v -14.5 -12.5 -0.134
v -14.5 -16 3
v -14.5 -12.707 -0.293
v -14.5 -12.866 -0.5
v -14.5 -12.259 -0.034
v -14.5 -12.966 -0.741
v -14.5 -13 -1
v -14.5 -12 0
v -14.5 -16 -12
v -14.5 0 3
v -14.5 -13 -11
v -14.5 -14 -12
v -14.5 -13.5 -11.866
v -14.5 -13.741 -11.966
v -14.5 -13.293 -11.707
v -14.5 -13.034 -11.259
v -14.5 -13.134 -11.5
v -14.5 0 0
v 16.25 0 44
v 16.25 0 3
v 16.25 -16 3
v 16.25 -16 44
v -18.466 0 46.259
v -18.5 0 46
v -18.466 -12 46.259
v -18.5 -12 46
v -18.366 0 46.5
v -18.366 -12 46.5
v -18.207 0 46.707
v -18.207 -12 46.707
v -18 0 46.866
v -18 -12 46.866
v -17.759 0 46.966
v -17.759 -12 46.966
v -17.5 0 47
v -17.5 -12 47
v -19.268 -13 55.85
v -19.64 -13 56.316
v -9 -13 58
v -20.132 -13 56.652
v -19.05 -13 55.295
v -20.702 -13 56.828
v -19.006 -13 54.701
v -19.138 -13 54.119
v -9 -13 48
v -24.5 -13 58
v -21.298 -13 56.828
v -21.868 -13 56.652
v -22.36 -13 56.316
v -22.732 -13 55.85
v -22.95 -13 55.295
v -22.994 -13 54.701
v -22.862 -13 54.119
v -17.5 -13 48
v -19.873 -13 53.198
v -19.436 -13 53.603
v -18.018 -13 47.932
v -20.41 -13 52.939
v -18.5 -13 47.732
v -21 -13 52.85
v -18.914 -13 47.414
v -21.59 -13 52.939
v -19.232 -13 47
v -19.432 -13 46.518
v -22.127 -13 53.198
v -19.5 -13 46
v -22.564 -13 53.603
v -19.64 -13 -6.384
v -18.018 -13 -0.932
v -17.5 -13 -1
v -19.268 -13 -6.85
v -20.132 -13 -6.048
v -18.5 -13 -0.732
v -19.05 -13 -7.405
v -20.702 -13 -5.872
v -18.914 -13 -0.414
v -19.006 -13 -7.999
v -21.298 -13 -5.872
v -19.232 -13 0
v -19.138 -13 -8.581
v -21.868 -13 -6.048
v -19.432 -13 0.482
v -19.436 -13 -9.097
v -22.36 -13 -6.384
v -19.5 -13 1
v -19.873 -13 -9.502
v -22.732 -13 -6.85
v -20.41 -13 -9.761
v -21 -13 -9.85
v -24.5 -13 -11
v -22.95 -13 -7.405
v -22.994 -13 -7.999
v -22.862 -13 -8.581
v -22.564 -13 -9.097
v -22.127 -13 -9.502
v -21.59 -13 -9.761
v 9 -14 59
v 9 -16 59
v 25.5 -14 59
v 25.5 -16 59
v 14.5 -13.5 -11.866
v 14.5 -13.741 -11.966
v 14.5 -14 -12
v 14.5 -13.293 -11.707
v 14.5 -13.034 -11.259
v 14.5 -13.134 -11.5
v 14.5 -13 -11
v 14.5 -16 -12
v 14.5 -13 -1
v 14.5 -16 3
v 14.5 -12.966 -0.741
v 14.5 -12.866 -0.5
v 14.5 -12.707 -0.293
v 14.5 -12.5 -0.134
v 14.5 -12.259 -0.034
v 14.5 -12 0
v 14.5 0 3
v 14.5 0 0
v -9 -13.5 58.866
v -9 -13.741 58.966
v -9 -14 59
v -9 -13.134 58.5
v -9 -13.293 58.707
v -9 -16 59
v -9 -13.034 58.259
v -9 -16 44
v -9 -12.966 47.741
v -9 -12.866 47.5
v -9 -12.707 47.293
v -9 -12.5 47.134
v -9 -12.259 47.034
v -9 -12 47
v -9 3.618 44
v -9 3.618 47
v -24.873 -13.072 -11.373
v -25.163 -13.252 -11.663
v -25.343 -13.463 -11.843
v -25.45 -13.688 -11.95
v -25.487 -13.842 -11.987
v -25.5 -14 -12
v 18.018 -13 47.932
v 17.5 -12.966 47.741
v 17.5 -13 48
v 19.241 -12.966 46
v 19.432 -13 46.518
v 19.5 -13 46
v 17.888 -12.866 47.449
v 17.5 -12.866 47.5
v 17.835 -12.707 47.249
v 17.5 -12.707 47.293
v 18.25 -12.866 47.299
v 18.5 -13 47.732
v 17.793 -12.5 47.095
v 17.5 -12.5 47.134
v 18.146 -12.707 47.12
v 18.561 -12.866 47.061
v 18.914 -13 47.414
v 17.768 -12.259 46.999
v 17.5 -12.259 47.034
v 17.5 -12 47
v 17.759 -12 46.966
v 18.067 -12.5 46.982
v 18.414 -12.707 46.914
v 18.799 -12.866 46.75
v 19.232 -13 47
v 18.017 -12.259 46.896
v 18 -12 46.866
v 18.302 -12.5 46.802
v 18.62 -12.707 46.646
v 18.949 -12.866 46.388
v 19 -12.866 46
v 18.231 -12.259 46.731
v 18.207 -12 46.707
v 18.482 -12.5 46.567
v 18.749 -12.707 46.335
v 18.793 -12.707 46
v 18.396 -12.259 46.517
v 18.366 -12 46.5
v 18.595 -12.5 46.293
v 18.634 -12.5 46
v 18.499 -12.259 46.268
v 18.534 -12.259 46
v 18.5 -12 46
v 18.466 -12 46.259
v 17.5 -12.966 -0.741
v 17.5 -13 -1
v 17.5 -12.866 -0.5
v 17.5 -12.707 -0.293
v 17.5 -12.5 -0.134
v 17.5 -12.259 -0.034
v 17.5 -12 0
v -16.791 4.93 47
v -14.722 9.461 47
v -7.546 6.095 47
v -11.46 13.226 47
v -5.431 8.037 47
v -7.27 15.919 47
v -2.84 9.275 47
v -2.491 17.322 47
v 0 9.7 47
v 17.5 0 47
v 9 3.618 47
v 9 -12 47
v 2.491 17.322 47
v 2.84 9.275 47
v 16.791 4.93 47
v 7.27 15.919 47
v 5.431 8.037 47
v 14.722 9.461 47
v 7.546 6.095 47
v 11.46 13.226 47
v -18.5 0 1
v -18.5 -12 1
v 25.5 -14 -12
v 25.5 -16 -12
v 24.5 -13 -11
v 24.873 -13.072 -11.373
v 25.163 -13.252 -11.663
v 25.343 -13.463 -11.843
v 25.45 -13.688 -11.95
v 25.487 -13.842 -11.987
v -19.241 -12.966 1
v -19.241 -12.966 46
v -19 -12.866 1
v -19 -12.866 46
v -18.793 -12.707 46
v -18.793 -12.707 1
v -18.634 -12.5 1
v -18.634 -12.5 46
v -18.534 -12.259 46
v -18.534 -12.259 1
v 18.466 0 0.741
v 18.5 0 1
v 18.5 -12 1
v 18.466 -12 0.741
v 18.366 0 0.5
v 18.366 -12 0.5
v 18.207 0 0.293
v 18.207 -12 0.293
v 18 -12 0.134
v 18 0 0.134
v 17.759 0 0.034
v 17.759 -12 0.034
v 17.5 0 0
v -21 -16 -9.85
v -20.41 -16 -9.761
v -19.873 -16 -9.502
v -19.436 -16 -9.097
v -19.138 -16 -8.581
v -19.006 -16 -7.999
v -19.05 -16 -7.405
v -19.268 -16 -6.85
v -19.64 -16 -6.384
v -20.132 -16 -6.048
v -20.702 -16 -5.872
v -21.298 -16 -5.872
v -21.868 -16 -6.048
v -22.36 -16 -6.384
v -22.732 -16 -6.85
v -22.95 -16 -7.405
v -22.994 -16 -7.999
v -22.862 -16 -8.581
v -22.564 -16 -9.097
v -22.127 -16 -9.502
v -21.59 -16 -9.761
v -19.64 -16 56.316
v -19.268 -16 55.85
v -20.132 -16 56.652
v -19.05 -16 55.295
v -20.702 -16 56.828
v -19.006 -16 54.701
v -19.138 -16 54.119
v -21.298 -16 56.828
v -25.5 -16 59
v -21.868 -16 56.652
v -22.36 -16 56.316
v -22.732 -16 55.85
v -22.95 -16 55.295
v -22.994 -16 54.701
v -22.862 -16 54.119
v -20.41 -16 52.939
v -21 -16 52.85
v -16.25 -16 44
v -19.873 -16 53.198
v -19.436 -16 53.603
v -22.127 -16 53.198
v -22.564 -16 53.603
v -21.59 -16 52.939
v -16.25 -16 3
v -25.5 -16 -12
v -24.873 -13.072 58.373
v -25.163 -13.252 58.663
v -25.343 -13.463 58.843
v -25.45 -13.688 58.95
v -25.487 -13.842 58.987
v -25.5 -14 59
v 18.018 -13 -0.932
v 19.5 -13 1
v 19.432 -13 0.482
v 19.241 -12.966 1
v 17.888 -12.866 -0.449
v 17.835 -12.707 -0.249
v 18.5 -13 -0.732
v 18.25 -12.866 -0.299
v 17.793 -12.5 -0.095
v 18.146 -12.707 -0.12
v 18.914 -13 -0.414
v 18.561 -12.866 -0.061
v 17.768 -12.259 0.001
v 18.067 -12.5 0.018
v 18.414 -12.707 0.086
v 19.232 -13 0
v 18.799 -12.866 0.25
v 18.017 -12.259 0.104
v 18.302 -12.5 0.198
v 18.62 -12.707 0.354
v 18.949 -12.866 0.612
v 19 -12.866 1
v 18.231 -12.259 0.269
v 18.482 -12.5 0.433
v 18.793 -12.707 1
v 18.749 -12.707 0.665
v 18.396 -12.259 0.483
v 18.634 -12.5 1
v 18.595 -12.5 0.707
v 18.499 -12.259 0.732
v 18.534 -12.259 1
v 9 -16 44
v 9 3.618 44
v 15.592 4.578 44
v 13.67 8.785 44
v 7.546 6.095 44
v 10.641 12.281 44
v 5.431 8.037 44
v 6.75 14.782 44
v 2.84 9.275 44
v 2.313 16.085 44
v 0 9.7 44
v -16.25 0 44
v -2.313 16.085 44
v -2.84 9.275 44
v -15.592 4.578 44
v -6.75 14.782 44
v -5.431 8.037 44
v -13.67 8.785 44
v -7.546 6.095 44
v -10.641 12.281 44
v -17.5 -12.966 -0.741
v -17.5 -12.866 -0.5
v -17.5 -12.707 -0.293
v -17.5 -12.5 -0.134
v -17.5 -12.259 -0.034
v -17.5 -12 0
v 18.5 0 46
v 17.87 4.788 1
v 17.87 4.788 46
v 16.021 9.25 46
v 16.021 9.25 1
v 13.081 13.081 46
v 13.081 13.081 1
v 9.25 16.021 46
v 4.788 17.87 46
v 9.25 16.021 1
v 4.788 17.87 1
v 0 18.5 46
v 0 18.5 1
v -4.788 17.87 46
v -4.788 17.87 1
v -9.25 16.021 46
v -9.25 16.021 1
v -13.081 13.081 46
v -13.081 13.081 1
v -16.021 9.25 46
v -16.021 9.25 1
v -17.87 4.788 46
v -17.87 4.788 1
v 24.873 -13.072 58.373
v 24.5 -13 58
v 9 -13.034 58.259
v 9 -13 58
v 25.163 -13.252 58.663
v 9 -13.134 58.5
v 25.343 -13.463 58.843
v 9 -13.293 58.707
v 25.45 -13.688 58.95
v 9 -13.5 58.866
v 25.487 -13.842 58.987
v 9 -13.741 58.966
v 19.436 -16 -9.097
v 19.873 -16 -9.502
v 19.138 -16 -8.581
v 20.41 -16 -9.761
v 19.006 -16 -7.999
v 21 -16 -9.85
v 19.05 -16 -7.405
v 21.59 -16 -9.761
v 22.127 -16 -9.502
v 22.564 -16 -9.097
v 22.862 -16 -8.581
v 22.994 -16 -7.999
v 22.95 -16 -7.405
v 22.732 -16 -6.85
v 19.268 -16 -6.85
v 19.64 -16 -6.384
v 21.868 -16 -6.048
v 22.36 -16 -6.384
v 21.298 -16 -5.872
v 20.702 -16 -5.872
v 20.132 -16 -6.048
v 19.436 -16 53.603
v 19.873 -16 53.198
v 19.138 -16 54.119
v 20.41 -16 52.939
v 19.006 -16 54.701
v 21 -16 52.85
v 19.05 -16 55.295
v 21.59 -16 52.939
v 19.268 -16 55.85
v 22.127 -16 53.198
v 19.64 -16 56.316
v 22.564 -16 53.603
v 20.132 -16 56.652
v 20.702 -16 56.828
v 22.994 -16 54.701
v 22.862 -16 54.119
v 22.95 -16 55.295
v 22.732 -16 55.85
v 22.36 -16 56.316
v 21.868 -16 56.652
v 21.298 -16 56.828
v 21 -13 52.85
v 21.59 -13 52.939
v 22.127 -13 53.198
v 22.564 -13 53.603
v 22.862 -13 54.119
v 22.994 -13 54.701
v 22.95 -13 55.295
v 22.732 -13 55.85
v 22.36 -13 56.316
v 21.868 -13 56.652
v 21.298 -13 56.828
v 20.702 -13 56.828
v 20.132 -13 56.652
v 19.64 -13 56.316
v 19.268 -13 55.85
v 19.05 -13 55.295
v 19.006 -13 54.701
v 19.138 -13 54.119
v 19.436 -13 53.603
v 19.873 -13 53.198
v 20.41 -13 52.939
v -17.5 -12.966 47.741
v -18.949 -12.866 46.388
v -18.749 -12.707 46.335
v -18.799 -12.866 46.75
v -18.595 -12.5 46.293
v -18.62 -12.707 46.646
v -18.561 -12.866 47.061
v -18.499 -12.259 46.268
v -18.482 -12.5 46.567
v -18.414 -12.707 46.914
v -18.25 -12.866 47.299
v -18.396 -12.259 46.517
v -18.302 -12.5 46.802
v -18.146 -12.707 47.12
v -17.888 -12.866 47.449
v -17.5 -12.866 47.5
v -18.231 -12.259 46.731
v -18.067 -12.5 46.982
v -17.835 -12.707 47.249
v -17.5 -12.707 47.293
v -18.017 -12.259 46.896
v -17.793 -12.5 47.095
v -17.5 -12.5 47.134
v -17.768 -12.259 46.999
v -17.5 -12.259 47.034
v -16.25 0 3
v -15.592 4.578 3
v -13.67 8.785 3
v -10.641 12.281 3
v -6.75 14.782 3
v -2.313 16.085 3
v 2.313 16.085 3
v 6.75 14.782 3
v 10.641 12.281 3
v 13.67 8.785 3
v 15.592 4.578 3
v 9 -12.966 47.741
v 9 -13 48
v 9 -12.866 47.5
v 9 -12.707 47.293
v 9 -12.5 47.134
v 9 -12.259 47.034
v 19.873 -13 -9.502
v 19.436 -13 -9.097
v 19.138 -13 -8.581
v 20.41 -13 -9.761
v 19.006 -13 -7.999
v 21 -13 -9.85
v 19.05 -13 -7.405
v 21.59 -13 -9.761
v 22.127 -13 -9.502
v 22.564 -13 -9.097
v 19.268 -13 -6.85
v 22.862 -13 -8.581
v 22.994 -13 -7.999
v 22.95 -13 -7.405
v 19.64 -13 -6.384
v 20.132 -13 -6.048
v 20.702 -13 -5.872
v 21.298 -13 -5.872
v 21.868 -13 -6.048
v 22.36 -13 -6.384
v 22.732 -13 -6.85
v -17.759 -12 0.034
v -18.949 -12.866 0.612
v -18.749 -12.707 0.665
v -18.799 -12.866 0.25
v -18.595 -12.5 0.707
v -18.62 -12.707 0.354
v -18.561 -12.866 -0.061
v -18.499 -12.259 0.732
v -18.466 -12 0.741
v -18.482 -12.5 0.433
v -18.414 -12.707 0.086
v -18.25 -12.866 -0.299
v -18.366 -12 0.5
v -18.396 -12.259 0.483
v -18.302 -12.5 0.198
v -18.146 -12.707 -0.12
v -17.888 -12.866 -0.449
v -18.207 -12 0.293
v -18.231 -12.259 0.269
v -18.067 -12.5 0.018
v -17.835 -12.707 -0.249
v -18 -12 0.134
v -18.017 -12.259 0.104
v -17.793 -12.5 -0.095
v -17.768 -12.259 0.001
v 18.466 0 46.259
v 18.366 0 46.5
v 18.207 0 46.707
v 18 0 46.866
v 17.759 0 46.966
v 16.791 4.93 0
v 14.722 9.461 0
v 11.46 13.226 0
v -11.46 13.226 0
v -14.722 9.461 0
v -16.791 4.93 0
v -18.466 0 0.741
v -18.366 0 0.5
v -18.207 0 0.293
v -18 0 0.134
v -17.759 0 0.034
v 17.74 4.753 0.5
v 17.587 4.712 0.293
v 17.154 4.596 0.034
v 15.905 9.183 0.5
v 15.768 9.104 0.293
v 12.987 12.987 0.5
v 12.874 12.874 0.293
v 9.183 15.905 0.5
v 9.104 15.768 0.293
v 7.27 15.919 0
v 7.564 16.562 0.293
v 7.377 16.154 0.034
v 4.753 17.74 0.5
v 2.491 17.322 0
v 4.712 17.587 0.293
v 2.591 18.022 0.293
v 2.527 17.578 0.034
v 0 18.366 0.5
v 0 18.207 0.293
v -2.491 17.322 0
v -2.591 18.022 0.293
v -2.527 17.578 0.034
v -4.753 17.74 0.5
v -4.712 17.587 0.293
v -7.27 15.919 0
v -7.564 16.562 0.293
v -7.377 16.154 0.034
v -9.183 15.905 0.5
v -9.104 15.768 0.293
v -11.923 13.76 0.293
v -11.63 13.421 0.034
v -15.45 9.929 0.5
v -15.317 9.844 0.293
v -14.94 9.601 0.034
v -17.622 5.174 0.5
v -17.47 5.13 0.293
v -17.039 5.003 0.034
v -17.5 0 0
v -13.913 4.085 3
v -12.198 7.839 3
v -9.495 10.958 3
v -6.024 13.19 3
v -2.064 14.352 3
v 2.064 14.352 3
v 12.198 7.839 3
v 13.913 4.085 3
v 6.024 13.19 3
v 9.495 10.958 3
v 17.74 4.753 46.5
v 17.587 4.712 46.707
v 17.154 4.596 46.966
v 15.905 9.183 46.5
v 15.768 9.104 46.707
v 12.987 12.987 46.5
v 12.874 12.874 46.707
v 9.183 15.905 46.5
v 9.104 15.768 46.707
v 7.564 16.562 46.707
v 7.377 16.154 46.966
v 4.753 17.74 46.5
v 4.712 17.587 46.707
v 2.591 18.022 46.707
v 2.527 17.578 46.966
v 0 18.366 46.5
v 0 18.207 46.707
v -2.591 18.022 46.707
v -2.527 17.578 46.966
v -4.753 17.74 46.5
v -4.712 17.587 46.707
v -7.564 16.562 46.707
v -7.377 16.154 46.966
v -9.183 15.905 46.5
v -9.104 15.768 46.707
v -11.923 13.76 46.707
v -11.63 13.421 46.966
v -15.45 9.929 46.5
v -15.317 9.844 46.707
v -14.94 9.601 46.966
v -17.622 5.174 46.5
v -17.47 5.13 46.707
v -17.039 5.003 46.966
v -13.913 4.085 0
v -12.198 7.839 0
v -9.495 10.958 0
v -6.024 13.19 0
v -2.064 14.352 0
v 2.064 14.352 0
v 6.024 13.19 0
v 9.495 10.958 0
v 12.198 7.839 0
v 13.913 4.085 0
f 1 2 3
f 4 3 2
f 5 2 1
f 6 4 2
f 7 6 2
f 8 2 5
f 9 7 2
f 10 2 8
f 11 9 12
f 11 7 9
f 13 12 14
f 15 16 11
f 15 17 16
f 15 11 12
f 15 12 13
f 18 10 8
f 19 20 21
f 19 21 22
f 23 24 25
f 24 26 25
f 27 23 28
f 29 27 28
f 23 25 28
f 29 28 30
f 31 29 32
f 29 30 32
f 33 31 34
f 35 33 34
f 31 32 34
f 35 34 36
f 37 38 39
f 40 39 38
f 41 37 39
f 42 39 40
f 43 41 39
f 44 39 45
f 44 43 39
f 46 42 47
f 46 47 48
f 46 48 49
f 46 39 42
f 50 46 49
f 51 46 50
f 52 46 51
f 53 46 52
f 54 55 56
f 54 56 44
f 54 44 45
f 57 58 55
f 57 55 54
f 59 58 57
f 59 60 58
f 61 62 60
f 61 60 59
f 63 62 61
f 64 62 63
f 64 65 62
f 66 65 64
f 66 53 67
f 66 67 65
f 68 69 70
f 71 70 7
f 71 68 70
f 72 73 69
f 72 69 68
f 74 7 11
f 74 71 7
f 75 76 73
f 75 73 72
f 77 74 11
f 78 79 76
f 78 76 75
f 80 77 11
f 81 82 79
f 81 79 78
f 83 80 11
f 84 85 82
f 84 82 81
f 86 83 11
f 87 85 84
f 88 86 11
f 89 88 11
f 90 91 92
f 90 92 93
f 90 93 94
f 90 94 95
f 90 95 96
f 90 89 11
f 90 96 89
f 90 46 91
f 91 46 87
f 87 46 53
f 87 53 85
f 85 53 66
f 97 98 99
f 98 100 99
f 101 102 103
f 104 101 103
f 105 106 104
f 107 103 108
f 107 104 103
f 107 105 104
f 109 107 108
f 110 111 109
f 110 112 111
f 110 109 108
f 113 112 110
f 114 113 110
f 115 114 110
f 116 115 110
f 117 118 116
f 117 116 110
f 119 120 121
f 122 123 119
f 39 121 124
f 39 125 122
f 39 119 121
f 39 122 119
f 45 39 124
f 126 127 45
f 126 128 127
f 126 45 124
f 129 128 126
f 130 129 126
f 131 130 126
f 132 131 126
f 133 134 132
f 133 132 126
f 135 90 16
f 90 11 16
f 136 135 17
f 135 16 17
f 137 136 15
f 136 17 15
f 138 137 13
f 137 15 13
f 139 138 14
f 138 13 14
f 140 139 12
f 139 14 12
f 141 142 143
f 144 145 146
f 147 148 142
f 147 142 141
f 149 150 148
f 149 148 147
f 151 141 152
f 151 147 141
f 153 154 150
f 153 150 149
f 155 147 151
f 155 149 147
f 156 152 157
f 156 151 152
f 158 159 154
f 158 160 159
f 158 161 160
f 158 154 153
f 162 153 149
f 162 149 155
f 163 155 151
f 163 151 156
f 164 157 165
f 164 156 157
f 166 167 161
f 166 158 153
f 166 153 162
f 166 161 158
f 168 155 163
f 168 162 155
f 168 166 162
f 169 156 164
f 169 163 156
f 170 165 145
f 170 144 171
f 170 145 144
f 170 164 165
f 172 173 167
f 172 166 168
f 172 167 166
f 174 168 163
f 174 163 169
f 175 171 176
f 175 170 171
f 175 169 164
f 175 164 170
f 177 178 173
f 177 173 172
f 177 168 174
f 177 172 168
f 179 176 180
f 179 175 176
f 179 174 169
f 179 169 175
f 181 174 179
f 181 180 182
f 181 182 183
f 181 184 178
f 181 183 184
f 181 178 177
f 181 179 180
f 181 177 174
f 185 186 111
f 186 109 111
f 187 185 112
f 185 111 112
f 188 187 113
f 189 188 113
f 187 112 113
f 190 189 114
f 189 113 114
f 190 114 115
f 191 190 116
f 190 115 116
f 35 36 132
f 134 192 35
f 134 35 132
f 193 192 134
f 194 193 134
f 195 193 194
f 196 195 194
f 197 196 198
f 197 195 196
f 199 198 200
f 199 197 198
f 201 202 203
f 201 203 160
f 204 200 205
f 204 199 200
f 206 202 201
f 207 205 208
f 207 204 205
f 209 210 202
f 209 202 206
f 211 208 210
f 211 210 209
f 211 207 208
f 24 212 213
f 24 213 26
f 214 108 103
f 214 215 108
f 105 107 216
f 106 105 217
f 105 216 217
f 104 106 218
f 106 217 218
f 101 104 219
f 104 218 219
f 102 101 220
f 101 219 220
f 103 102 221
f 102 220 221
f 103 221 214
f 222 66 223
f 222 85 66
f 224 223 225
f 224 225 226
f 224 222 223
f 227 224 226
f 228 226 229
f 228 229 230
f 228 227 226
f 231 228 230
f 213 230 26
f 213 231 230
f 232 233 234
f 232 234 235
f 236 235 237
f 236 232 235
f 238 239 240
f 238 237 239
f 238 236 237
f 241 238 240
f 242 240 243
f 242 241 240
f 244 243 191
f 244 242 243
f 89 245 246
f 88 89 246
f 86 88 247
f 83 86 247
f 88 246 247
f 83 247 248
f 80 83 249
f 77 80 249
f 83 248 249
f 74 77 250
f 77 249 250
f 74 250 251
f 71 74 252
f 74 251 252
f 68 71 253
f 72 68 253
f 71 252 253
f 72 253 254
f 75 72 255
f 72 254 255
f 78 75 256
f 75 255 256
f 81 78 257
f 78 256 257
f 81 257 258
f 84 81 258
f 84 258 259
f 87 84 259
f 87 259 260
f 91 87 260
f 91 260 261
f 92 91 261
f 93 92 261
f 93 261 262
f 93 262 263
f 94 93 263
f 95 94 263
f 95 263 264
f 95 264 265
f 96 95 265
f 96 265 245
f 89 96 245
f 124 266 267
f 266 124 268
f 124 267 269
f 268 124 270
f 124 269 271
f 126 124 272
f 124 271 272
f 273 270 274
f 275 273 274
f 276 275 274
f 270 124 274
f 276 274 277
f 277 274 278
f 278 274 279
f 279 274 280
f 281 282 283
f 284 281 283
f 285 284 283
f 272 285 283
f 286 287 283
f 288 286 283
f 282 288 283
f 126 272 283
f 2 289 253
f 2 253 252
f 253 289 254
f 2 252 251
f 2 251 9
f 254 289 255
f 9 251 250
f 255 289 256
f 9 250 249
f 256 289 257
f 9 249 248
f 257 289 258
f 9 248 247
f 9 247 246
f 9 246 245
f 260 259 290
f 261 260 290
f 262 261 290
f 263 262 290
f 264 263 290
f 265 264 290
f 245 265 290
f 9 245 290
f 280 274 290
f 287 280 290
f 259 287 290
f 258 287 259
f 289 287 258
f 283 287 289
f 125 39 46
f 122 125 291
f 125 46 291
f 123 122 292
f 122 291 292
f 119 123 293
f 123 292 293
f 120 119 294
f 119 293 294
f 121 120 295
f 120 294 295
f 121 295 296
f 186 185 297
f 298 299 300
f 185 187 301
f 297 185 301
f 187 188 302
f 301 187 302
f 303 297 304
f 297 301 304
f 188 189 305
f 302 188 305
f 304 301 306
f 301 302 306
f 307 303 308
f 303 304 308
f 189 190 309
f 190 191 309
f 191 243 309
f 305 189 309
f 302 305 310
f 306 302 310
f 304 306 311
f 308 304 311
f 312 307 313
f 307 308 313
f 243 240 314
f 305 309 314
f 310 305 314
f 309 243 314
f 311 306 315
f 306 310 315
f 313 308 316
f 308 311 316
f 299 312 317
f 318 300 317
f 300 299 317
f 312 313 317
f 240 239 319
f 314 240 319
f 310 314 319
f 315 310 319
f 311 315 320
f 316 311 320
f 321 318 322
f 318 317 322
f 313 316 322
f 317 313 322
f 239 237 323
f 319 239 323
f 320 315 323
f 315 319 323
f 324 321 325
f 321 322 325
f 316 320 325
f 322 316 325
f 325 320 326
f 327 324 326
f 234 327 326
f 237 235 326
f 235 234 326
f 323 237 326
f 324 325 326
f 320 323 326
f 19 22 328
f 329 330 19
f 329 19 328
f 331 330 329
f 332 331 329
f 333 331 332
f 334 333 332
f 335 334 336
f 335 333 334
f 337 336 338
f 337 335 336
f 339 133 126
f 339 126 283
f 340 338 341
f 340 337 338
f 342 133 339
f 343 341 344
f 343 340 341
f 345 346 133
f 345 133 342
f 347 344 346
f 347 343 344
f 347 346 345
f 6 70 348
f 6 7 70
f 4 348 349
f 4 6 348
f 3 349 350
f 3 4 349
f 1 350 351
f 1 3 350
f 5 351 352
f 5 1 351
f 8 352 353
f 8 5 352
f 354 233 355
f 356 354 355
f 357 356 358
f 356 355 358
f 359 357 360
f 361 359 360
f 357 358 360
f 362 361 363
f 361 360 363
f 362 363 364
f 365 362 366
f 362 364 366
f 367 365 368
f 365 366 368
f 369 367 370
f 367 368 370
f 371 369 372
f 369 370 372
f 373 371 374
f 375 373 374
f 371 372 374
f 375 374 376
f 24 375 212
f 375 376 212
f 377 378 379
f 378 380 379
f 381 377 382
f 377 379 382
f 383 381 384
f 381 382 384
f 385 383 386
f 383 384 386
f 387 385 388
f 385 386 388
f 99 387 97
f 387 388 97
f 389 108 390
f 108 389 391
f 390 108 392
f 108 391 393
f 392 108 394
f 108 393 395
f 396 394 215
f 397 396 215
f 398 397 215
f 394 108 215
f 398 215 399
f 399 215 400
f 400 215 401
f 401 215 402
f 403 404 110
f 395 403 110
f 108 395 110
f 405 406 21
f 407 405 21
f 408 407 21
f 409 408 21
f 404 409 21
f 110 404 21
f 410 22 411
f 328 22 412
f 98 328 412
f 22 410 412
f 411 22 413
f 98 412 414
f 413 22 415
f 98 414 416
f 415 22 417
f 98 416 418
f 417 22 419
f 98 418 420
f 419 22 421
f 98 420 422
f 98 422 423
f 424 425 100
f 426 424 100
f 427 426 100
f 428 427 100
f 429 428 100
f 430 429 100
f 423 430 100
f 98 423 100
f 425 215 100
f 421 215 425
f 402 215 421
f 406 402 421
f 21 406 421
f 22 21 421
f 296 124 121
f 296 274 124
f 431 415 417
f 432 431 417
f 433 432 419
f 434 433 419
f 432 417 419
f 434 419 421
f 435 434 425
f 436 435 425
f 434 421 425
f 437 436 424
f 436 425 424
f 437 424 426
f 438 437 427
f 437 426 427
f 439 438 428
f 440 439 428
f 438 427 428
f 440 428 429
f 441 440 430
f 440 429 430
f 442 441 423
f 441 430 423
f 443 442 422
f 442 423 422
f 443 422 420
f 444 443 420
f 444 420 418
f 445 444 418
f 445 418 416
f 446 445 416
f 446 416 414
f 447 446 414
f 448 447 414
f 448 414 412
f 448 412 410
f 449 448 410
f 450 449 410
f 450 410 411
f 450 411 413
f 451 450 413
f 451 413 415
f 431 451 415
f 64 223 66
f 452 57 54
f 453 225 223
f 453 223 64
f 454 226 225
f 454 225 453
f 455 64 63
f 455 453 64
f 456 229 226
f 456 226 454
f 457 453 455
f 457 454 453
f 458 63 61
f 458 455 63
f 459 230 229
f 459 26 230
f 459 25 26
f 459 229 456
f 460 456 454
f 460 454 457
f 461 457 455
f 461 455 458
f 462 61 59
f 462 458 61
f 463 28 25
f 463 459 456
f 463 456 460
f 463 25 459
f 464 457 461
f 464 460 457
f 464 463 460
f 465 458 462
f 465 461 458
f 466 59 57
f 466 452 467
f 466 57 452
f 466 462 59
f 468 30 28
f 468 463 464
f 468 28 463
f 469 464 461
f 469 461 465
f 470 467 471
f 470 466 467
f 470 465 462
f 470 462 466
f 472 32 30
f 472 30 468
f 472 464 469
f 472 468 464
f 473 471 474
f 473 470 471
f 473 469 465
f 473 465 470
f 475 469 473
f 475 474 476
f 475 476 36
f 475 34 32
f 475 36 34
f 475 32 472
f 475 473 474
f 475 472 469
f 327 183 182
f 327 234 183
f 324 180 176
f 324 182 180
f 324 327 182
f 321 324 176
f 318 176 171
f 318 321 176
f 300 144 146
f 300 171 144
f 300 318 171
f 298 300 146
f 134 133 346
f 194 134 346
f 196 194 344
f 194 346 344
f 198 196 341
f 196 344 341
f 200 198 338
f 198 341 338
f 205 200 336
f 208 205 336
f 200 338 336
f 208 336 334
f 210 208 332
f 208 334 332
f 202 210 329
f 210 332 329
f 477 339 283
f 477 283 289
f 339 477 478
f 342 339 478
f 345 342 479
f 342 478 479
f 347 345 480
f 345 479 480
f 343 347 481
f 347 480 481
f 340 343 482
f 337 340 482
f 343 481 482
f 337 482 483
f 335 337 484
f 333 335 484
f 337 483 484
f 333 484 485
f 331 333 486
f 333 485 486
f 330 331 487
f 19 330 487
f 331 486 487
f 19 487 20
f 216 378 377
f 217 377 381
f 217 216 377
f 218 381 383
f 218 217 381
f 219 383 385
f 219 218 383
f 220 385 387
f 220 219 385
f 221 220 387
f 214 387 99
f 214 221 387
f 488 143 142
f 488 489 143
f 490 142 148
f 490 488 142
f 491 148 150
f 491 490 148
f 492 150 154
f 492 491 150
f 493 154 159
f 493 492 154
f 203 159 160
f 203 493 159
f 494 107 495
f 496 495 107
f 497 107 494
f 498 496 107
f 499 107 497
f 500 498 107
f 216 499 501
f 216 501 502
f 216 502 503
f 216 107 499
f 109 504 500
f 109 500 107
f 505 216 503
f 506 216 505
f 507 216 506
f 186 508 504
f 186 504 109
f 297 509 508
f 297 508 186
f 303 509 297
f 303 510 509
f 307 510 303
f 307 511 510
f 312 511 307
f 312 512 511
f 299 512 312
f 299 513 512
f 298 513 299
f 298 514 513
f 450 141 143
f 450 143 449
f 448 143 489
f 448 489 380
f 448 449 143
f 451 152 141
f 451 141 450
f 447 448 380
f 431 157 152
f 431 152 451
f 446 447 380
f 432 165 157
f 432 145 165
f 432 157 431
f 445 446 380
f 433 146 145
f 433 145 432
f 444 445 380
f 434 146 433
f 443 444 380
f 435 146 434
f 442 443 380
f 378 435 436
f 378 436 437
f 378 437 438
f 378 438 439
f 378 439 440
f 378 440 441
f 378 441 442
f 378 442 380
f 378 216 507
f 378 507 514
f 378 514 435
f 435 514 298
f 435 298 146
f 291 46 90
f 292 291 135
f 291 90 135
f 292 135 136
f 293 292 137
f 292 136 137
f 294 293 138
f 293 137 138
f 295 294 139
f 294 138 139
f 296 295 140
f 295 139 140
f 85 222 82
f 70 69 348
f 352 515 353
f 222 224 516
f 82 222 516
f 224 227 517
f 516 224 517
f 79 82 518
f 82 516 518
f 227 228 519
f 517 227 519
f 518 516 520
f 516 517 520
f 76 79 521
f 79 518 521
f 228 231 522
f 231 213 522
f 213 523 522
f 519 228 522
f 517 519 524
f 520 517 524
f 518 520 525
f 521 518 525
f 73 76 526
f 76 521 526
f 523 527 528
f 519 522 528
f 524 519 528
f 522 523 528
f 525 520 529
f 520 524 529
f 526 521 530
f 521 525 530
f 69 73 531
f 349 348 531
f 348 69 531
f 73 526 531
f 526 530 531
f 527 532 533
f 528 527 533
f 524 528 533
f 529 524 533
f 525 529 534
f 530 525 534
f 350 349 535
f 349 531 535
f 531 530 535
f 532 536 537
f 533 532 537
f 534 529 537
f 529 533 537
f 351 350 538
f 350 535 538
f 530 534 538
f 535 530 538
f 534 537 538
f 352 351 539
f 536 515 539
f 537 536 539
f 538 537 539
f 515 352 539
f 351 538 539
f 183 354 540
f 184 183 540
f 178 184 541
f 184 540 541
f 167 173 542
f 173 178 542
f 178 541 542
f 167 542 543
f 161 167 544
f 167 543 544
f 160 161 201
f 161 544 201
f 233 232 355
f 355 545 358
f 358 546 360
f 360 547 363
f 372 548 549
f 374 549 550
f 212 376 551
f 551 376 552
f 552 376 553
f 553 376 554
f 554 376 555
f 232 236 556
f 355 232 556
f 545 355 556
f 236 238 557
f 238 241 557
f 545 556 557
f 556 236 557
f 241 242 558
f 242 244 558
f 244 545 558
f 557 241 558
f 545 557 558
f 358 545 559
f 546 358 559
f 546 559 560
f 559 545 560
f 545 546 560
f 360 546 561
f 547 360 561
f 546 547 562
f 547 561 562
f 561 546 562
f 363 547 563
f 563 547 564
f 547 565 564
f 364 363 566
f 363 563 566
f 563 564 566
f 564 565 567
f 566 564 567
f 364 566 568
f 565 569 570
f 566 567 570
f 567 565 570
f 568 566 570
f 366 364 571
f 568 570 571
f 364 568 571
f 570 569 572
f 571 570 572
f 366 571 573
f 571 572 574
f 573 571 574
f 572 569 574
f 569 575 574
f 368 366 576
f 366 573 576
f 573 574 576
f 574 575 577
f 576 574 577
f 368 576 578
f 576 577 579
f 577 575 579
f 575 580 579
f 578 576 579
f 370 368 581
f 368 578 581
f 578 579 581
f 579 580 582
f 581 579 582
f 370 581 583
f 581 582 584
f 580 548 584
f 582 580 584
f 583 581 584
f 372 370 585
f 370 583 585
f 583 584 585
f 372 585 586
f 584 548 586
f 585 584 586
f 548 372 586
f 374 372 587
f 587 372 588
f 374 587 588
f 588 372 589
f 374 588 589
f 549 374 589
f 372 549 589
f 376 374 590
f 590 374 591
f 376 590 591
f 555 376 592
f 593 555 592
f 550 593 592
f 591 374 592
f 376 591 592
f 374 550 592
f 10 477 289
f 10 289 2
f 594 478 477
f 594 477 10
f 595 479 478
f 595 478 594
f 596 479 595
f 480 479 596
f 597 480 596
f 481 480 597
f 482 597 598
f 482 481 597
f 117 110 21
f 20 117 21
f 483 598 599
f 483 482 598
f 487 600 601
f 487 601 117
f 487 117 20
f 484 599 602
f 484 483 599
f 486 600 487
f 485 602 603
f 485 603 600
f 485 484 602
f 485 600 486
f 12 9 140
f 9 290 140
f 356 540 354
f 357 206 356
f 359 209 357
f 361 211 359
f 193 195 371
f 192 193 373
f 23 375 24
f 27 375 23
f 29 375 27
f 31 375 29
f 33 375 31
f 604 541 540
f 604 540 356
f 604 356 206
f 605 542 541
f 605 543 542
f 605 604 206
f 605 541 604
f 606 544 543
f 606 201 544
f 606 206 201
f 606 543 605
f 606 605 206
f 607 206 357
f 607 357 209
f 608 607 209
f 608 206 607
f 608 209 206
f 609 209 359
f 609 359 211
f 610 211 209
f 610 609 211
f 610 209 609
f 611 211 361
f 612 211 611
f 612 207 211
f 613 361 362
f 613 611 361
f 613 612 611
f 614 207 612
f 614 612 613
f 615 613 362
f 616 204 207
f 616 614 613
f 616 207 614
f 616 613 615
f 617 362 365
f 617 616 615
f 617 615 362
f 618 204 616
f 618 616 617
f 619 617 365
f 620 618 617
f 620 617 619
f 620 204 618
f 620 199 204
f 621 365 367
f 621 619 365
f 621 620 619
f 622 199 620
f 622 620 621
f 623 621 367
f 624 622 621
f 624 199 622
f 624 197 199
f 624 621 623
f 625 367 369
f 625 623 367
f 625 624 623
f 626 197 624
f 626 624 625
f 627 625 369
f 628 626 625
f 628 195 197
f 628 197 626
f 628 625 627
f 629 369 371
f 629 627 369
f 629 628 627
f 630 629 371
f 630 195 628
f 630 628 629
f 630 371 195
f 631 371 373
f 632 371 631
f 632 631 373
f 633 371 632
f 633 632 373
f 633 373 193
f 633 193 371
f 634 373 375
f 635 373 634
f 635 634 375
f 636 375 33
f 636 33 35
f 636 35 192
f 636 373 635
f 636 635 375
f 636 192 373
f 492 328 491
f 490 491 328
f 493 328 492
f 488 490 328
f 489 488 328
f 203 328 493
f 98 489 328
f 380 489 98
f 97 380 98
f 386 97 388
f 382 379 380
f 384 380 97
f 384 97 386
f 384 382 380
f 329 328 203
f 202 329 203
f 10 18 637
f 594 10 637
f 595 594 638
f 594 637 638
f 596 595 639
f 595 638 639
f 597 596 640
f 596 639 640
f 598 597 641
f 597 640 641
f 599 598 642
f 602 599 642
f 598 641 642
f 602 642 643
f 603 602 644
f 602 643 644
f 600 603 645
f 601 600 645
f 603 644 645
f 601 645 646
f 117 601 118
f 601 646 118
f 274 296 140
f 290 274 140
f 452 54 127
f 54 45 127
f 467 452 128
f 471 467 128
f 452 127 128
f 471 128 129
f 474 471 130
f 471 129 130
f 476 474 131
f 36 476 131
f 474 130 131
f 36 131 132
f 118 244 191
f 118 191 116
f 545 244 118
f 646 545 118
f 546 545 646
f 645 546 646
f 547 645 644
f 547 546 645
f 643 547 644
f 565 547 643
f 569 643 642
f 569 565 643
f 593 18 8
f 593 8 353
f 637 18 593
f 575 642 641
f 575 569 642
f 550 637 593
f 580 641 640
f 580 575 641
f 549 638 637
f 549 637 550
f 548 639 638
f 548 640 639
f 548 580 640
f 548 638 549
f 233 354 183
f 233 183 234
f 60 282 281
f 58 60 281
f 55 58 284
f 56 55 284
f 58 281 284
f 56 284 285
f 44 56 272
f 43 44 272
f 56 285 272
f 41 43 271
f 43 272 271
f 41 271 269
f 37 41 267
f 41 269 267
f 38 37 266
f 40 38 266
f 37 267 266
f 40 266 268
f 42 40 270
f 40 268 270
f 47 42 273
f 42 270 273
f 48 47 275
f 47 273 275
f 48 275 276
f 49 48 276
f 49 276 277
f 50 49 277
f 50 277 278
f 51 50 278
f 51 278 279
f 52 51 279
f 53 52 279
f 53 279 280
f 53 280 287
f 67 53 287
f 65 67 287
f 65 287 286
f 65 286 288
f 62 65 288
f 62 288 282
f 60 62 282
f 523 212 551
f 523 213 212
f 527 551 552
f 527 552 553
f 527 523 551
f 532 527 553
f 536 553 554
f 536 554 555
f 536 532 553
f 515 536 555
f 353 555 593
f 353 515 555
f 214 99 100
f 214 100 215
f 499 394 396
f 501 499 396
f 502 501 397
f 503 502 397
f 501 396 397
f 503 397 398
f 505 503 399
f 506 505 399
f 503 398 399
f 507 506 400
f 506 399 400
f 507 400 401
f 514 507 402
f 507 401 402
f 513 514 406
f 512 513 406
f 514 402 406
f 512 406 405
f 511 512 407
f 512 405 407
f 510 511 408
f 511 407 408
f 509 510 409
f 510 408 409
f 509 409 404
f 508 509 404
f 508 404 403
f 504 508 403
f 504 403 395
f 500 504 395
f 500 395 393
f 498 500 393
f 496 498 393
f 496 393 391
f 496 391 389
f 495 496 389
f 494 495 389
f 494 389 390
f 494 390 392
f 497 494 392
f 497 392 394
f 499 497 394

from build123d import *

# Parameters (mm, degrees)
BOSS_EXTRU_1_DEPTH      = 3
BOSS_EXTRU_2_DEPTH      = 44
BOSS_EXTRU_4_START      = -3
BOSS_EXTRU_4_DEPTH      = 3
BOSS_EXTRU_6_DEPTH      = 16
ESQUISSE10_W            = 71
ESQUISSE10_H            = 3
BOSS_EXTRU_10_DEPTH     = 7
ESQUISSE12_R            = 2
ENL_V_MAT_EXTRU_1_DEPTH = 73.94861205
ESQUISSE13_W            = 12
ESQUISSE13_H            = 3
BOSS_EXTRU_11_DEPTH     = 9.5
ESQUISSE14_W            = 12
ESQUISSE14_H            = 3
BOSS_EXTRU_12_DEPTH     = 9.5
ESQUISSE15_W            = 12
ESQUISSE15_H            = 3
BOSS_EXTRU_13_DEPTH     = 4
ESQUISSE16_W            = 12
ESQUISSE16_H            = 3
BOSS_EXTRU_14_DEPTH     = 4
CONG_7_R                = 1


with BuildPart() as part:
    # Esquisse1 → Boss.-Extru.1 (new body)
    with BuildSketch(Plane.XY):
        with BuildLine():
            Line((-18.5, 0), (-14.5, 0))
            ThreePointArc((-14.5, 0), (0, 14.5), (14.5, 0))
            Line((14.5, 0), (18.5, 0))
            ThreePointArc((18.5, 0), (0, 18.5), (-18.5, 0))
        make_face()
    extrude(amount=BOSS_EXTRU_1_DEPTH)

    # Esquisse3 → Boss.-Extru.2 (add)
    with BuildSketch(Plane.XY.offset(3)):
        with BuildLine():
            Line((-18.5, 0), (-16.25, 0))
            ThreePointArc((-16.25, 0), (0, 16.25), (16.25, 0))
            Line((16.25, 0), (18.5, 0))
            ThreePointArc((18.5, 0), (0, 18.5), (-18.5, 0))
        make_face()
    extrude(amount=BOSS_EXTRU_2_DEPTH)

    # Esquisse4 → Boss.-Extru.4 (add)
    with BuildSketch(Plane.XY.offset(47).offset(BOSS_EXTRU_4_START)):
        with BuildLine():
            Line((9, 0), (18.5, 0))
            ThreePointArc((18.5, 0), (0, 18.5), (-18.5, 0))
            Line((-18.5, 0), (-9, 0))
            Line((-9, 0), (-9, 3.618010503))
            ThreePointArc((-9, 3.618010503), (0, 9.7), (9, 3.618010503))
            Line((9, 3.618010503), (9, 0))
        make_face()
    extrude(amount=BOSS_EXTRU_4_DEPTH)

    # Esquisse6 → Boss.-Extru.6 (add)
    with BuildSketch(Plane.XZ):
        Polygon((14.5, 3), (16.25, 3), (16.25, 44), (9, 44), (9, 47), (18.5, 47), (18.5, 0), (14.5, 0), align=None)
        Polygon((-14.5, 3), (-14.5, 0), (-18.5, 0), (-18.5, 47), (-9, 47), (-9, 44), (-16.25, 44), (-16.25, 3), align=None)
    extrude(amount=BOSS_EXTRU_6_DEPTH)

    # Esquisse10 → Boss.-Extru.10 (add)
    with BuildSketch(Plane(origin=(18.5, 0, 0), x_dir=(0, 0, -1), z_dir=(1, 0, 0))):
        with Locations((-23.5, -14.5)):
            Rectangle(ESQUISSE10_W, ESQUISSE10_H)
    boss_extru_10 = extrude(amount=BOSS_EXTRU_10_DEPTH)

    # Symétrie4: Boss.-Extru.10 across plane
    add(boss_extru_10.mirror(Plane(origin=(0, 0, 0), x_dir=(0, 0, 1), z_dir=(1, 0, 0))))

    # Esquisse12 → Enlèv. mat.-Extru.1 (cut, through all)
    with BuildSketch(Plane.XZ.offset(16)):
        with Locations(Location((21, 54.85, 0), (0, 0, 270))):
            Circle(ESQUISSE12_R)
        with Locations(Location((21, -7.85, 0), (0, 0, 270))):
            Circle(ESQUISSE12_R)
        with Locations(Location((-21, -7.85, 0), (0, 0, 270))):
            Circle(ESQUISSE12_R)
        with Locations(Location((-21, 54.85, 0), (0, 0, 270))):
            Circle(ESQUISSE12_R)
    extrude(amount=-ENL_V_MAT_EXTRU_1_DEPTH, mode=Mode.SUBTRACT)

    # Esquisse13 → Boss.-Extru.11 (add)
    with BuildSketch(Plane(origin=(-18.5, 0, 0), x_dir=(0, 0, -1), z_dir=(1, 0, 0))):
        with Locations((-53, -14.5)):
            Rectangle(ESQUISSE13_W, ESQUISSE13_H)
    extrude(amount=BOSS_EXTRU_11_DEPTH)

    # Esquisse14 → Boss.-Extru.12 (add)
    with BuildSketch(Plane.ZY.offset(-18.5)):
        with Locations((53, -14.5)):
            Rectangle(ESQUISSE14_W, ESQUISSE14_H)
    extrude(amount=BOSS_EXTRU_12_DEPTH)

    # Esquisse15 → Boss.-Extru.13 (add)
    with BuildSketch(Plane.ZY.offset(-18.5)):
        with Locations((-6, -14.5)):
            Rectangle(ESQUISSE15_W, ESQUISSE15_H)
    extrude(amount=BOSS_EXTRU_13_DEPTH)

    # Esquisse16 → Boss.-Extru.14 (add)
    with BuildSketch(Plane(origin=(-18.5, 0, 0), x_dir=(0, 0, -1), z_dir=(1, 0, 0))):
        with Locations((6, -14.5)):
            Rectangle(ESQUISSE16_W, ESQUISSE16_H)
    extrude(amount=BOSS_EXTRU_14_DEPTH)

    # Congé7
    cong_7_edges = [part.edges().sort_by_distance(p)[0] for p in [
        (-18.5, -6.5, 0),
        (-18.5, -6.5, 47),
        (-18.5, -13, 23.5),
        (-20, -13, -12),
        (-25.5, -13, 23.5),
        (-17.25, -13, 59),
        (-13.75, -13, 47),
        (13.75, -13, 47),
        (0, 18.5, 47),
        (16.5, -13, 0),
        (-16.5, -13, 0),
        (0, 18.5, 0),
        (18.5, -6.5, 47),
        (18.5, -6.5, 0),
        (18.5, -13, 23.5),
        (20, -13, -12),
        (17.25, -13, 59),
        (25.5, -13, 23.5),
    ]]
    fillet(cong_7_edges, radius=CONG_7_R)


solid = part.part
